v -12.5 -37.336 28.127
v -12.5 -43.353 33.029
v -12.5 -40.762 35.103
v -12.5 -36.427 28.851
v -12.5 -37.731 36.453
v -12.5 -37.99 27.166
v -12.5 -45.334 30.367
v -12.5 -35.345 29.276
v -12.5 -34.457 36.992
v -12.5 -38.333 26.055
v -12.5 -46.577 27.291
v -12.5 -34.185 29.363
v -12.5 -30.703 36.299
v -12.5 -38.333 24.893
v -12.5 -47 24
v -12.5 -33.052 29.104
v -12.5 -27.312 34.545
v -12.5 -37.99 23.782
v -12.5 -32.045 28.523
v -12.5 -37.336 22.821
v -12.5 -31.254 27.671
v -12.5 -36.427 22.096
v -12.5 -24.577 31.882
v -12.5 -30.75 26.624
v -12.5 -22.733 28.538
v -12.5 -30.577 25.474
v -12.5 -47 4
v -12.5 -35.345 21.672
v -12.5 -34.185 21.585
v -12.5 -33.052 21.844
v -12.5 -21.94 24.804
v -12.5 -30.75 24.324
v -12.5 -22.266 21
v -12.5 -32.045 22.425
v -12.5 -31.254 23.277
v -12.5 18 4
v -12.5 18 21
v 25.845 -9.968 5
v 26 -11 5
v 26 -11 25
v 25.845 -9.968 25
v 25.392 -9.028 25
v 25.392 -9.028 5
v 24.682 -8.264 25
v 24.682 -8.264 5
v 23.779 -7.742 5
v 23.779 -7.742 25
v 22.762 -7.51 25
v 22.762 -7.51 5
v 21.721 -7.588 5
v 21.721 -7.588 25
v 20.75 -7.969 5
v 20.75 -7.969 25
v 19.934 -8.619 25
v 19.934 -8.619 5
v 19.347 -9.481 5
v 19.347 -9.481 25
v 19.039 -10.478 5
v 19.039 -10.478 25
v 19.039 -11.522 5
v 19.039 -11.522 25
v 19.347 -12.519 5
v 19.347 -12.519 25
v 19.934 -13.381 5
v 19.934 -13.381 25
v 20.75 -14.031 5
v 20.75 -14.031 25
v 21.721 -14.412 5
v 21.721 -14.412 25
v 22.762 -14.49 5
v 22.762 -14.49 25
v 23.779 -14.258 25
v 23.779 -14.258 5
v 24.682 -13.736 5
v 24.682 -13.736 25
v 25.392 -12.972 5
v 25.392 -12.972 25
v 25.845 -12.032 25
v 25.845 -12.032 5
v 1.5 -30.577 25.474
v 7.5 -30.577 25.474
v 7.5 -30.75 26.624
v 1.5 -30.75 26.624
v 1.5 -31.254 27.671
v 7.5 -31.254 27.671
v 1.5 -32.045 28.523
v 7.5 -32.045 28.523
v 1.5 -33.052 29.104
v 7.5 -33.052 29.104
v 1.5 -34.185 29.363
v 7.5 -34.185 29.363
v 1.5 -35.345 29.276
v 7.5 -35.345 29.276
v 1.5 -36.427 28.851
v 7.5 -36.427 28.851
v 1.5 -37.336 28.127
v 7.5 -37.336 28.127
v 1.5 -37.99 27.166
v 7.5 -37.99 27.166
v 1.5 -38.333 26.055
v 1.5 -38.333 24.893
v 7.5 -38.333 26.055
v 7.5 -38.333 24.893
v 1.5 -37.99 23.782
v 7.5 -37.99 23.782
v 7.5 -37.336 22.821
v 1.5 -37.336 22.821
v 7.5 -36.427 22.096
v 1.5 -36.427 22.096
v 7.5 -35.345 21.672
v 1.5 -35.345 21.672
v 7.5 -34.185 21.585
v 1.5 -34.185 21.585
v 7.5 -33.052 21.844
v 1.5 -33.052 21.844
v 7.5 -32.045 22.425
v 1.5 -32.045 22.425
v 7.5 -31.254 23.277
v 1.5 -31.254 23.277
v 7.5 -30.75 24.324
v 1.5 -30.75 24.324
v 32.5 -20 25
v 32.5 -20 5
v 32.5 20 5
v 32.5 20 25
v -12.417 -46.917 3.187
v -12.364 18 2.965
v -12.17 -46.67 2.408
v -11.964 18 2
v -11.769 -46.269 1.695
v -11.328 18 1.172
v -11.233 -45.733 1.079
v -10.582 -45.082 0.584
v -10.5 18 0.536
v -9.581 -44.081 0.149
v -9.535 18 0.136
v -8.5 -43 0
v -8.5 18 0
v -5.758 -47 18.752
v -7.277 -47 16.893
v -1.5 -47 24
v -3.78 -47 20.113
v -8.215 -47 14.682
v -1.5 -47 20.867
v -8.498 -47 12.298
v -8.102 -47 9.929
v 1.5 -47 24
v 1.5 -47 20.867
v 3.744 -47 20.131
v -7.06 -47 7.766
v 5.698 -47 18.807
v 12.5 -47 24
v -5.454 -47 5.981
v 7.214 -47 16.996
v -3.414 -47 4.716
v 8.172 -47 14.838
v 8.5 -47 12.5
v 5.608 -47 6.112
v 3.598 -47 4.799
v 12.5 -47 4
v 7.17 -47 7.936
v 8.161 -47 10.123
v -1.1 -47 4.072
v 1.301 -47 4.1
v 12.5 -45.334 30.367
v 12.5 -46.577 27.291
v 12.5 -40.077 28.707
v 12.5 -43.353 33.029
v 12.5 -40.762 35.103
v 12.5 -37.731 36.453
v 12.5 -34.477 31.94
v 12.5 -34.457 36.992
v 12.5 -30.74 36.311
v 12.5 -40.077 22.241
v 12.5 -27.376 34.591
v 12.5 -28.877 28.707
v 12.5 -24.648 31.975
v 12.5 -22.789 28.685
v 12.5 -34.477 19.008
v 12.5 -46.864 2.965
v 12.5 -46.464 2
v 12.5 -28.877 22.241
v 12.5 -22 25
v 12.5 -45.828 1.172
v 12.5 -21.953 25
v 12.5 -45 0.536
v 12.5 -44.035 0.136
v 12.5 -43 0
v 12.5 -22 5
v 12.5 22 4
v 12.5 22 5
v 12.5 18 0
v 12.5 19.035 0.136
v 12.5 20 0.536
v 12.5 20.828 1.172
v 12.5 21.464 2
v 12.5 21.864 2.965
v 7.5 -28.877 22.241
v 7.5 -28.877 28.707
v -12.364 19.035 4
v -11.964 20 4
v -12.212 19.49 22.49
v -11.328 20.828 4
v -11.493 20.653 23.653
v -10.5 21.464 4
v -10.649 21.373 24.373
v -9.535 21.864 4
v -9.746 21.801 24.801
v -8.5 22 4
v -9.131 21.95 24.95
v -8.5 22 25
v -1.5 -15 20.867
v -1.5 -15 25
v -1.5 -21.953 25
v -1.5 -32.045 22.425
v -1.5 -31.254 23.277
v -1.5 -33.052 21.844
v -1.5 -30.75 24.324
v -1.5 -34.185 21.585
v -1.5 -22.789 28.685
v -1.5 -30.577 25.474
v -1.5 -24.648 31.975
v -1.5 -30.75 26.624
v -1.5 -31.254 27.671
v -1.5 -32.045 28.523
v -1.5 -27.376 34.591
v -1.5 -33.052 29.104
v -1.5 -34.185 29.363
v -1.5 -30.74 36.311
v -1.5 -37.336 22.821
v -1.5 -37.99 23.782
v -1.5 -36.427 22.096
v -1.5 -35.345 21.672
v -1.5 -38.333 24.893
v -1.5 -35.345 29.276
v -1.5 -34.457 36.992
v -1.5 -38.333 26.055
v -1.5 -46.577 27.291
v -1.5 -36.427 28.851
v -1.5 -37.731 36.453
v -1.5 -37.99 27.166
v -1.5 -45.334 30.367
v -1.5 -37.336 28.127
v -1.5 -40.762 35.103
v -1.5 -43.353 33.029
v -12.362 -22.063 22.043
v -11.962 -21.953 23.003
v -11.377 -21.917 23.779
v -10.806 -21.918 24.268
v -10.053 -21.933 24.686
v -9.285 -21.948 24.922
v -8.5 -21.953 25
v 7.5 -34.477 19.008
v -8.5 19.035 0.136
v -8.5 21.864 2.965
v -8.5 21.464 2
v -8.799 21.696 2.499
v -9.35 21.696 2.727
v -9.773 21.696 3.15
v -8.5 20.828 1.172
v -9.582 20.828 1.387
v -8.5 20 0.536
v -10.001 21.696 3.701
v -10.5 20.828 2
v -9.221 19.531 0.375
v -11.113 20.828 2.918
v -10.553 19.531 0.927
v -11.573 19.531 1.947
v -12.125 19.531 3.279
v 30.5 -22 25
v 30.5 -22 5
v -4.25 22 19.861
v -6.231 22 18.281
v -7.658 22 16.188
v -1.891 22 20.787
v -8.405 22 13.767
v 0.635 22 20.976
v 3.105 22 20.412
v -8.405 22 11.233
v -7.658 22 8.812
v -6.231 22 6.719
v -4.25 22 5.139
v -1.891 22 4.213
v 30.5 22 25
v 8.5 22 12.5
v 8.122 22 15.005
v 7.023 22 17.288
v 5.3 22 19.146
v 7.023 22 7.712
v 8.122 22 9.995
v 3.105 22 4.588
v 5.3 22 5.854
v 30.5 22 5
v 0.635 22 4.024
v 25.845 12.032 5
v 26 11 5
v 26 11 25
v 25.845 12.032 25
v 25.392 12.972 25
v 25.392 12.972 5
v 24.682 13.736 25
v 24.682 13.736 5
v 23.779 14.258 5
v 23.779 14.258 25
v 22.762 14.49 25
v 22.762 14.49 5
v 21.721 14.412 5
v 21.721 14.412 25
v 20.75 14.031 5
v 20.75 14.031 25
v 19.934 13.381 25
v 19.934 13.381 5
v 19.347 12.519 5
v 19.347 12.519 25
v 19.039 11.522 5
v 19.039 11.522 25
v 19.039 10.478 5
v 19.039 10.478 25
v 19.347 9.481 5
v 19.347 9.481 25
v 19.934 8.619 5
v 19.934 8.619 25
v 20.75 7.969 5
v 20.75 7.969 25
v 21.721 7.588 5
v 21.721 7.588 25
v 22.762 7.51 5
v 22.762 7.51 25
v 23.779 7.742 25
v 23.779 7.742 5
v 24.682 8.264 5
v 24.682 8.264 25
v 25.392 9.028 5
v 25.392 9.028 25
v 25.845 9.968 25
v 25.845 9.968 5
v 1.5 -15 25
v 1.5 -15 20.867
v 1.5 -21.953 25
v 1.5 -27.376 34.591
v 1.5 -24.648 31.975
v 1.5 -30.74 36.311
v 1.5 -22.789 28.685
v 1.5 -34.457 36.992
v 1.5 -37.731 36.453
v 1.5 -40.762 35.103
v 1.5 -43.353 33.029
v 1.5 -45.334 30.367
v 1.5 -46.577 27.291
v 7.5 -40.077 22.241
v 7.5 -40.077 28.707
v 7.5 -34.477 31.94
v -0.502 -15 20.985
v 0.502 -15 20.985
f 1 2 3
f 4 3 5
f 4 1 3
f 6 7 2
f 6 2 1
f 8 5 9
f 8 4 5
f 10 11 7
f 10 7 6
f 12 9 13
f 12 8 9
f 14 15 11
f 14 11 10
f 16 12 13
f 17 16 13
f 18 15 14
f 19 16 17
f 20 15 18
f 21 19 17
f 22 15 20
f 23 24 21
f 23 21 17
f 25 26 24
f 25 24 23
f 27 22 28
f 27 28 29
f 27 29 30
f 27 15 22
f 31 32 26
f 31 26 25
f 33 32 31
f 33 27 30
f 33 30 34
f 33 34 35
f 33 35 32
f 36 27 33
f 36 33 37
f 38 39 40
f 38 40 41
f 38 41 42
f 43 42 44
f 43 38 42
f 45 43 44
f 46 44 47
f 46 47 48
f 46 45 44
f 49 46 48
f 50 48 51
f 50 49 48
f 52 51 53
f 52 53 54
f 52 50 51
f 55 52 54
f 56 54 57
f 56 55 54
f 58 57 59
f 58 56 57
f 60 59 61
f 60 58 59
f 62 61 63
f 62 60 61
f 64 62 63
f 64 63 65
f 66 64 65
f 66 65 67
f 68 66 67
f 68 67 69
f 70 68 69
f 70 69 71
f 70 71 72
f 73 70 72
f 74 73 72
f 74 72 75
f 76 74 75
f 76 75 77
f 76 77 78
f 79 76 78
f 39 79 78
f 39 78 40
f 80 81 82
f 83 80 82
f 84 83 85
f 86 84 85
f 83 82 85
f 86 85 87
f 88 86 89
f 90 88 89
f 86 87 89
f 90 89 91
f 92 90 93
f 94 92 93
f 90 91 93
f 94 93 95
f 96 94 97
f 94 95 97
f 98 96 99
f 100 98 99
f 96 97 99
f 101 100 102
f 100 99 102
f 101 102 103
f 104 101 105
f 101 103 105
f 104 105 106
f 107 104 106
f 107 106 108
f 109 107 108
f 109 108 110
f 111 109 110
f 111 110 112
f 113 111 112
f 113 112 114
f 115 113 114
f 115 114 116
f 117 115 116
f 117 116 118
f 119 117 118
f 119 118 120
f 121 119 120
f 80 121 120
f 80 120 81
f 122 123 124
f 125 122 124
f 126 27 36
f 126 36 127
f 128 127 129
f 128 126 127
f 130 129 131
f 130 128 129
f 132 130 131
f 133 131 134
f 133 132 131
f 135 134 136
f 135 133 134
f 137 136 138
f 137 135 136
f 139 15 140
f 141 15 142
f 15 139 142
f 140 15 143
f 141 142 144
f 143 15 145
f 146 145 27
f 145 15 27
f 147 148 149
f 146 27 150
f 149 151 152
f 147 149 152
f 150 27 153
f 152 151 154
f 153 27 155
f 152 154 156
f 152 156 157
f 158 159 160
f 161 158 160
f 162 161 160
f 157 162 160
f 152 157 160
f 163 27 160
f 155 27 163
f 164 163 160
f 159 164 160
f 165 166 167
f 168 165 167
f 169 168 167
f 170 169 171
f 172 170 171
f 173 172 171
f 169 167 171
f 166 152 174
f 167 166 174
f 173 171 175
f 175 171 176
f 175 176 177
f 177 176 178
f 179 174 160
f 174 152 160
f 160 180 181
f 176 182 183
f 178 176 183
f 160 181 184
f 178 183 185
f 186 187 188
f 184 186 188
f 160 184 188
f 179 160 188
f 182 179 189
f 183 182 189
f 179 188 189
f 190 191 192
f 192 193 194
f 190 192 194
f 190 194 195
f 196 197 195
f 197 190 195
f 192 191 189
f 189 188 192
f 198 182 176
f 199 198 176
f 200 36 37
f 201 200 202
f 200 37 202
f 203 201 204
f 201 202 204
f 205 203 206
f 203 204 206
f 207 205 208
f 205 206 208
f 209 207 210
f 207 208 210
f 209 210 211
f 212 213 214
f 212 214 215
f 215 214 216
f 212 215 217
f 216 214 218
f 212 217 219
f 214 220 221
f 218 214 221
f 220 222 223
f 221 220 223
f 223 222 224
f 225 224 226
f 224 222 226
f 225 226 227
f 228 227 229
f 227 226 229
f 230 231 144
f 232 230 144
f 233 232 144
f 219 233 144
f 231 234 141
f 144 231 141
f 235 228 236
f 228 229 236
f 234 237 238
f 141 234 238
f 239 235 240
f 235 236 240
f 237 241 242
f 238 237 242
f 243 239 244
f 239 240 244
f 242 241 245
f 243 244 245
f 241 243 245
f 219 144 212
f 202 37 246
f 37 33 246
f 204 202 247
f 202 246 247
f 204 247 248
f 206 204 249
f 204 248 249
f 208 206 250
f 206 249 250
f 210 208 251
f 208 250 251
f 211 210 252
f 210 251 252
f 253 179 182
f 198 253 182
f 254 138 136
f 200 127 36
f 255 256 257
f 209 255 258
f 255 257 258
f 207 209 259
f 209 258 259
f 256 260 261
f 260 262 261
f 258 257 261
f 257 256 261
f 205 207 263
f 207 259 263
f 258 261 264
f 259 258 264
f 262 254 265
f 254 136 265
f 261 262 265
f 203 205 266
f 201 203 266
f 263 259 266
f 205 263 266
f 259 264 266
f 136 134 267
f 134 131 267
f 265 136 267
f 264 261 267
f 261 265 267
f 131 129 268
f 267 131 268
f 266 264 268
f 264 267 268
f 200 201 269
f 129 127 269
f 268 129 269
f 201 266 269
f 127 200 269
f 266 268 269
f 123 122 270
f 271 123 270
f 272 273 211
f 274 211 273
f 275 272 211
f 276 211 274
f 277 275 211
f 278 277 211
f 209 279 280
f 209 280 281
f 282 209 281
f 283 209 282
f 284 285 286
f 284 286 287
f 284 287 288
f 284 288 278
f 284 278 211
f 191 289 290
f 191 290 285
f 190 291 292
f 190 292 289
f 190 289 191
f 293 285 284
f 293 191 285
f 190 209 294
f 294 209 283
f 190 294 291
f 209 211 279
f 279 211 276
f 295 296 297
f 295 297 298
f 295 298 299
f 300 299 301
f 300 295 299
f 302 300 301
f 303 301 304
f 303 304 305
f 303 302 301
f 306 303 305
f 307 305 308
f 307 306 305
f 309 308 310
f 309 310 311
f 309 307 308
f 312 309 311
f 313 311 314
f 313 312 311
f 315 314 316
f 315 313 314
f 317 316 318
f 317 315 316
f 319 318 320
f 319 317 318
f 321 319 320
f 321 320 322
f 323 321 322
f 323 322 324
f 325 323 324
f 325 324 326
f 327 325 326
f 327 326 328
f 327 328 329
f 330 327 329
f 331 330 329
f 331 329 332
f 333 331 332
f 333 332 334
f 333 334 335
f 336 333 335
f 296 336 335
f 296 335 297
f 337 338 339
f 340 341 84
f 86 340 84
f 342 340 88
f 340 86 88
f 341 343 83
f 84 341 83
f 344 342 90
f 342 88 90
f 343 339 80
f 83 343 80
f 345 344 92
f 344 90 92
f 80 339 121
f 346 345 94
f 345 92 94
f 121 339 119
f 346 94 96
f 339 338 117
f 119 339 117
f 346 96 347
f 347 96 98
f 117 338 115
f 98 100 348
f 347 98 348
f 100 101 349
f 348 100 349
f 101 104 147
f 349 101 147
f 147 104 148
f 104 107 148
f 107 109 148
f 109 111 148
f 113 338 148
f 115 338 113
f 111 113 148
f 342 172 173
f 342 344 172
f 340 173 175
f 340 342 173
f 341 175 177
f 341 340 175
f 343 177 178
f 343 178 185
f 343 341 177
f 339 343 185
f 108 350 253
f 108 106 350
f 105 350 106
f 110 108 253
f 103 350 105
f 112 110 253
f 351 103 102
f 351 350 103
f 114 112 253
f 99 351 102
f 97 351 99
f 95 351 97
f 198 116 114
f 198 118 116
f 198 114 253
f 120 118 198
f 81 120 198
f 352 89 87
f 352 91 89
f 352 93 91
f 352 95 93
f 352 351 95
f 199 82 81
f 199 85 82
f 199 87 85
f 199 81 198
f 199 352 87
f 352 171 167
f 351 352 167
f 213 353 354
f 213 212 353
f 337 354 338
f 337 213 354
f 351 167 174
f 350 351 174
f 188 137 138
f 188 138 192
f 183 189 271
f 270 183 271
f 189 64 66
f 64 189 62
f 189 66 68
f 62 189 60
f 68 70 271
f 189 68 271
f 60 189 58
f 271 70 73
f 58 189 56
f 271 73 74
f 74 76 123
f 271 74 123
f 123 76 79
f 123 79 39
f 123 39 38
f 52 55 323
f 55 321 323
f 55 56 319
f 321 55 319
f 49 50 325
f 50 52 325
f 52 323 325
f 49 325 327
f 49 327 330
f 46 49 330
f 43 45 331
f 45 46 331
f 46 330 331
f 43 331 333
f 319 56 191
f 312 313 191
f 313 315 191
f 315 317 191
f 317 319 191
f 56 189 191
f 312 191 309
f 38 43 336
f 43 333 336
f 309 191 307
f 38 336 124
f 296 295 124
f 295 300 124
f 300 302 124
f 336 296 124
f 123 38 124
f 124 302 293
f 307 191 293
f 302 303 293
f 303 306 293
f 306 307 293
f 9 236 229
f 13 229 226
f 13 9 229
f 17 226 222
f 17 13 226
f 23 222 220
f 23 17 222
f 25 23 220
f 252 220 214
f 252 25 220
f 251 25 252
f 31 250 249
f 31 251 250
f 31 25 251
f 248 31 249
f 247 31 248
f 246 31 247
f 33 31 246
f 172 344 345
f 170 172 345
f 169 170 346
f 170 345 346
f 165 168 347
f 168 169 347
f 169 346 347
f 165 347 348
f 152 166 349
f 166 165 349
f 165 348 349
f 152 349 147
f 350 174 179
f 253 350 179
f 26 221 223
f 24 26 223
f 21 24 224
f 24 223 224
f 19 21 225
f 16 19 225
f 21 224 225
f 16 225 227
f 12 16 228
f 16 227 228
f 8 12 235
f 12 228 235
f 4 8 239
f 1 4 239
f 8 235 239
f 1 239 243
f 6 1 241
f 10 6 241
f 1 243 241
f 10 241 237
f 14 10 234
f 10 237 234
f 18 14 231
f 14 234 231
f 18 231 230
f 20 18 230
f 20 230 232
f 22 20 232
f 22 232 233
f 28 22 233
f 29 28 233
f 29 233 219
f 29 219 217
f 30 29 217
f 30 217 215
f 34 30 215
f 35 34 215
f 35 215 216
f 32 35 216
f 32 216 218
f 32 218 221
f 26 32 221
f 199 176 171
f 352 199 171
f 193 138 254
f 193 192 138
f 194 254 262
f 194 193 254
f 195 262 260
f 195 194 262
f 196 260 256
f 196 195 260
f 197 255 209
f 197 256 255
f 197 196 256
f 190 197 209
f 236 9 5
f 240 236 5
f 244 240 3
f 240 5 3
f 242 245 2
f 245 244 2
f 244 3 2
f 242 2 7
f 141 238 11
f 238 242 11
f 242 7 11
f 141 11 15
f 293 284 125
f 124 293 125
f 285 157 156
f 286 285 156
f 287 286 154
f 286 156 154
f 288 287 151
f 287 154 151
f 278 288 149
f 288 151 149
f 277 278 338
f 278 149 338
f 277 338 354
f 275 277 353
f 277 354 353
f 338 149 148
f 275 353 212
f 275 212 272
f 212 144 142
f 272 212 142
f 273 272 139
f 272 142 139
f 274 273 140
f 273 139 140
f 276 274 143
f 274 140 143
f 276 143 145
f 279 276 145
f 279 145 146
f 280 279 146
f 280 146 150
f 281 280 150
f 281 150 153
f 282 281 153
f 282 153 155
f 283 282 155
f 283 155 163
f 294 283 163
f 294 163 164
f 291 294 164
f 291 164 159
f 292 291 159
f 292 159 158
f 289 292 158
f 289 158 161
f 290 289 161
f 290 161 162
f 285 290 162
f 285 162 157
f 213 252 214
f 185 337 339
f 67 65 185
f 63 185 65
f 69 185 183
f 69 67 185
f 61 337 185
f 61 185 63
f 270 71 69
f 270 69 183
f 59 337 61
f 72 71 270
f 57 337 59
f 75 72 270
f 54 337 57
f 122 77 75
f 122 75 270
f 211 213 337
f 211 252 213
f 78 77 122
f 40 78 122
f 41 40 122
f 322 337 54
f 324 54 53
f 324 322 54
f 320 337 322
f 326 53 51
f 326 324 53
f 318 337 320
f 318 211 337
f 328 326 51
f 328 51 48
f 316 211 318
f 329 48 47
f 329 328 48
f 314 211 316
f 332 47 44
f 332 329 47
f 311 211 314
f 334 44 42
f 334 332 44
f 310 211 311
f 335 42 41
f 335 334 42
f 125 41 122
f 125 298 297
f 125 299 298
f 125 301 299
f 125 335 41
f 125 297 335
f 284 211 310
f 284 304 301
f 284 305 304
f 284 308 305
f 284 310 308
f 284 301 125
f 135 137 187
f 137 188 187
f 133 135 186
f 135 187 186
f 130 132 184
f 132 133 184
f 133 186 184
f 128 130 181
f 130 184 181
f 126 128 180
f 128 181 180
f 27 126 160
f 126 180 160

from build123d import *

# Parameters (mm, degrees)
F0_W         = 25
F0_H         = 44
F0_H_2       = 25
F1_DEPTH     = 25
F0_W_2       = 20
F0_R         = 3.5
F2_DEPTH     = 25
F3_R         = 8.5
F4_DEPTH     = 69.001
F5_W         = 11
F5_H         = 25.0466239899
F6_DEPTH     = 12
F5_W_2       = 3
F5_H_2       = 6.9533760101
F7_DEPTH     = 4.1343997347
F9_T1_DEPTH  = 76
F9_T3_DEPTH  = 76
F9_T5_DEPTH  = 75.8074069841
F9_T7_DEPTH  = 75.8074069841
F10_DEPTH    = 5
F8_R         = 3.9
F11_DEPTH    = 25.001
F12_DEPTH    = 25.001
F13_DEPTH    = 5
F14_R        = 3.99999
F15_T1_DEPTH = 30.2867319519


# Not quite as in the source:
# - a fillet or chamfer that OpenCascade refuses, or shapes differently, is made with other operations: its cross-section is extruded or revolved along the edge and cut away or added
# - a fillet or chamfer is up to 0.001 mm smaller than in the source, because OpenCascade refuses the exact size
# - a feature names something its author has since deleted; it is built from what else it names


with BuildPart() as f1:
    # F0 (on Top) → F1 (new body)
    with BuildSketch(Plane.XY):
        Rectangle(F0_W, F0_H)
        with Locations((0, -34.5)):
            Rectangle(F0_W, F0_H_2)
    extrude(amount=F1_DEPTH)

    # F0 (on Top) → F2 (join)
    with BuildSketch(Plane.XY):
        with Locations((22.5, 0)):
            Rectangle(F0_W_2, F0_H)
        with Locations((22.5, -11)):
            Circle(F0_R, mode=Mode.SUBTRACT)
        with Locations((22.5, 11)):
            Circle(F0_R, mode=Mode.SUBTRACT)
    extrude(amount=F2_DEPTH)

    # F3 (on face) → F4 (cut, through all)
    with BuildSketch(Plane.XZ.offset(47)):
        with Locations((0, 12.5)):
            Circle(F3_R)
    extrude(amount=-F4_DEPTH, mode=Mode.SUBTRACT)

    # F5 (on face) → F6 (join)
    with BuildSketch(Plane.XY.offset(25)):
        with Locations((-7, -34.476688005)):
            Rectangle(F5_W, F5_H)
        Polygon((12.5, -22), (12.5, -21.9533760101), (1.5, -21.9533760101), (1.5, -47), (12.5, -47), align=None)
    extrude(amount=F6_DEPTH)

    # F5 (on face) → F7 (cut, through all)
    with BuildSketch(Plane.XY.offset(25)):
        with Locations((0, -34.476688005)):
            Rectangle(F5_W_2, F5_H)
        with Locations((0, -18.476688005)):
            Rectangle(F5_W_2, F5_H_2)
    extrude(amount=-F7_DEPTH, mode=Mode.SUBTRACT)

    # F9: fillet of radius 13 on 4 edges, made by hand

    # F9_s2 → F9_t1 (cut)
    with BuildSketch(Plane.YZ.offset(-45)):
        with BuildLine():
            ThreePointArc((-34, 37), (-43.1923881554, 33.1923881554), (-47, 24))
            Line((-47, 24), (-47, 37))
            Line((-47, 37), (-34, 37))
        make_face()
    extrude(amount=F9_T1_DEPTH, mode=Mode.SUBTRACT)

    # F9_s4 → F9_t3 (cut)
    with BuildSketch(Plane.YZ.offset(-31)):
        with BuildLine():
            ThreePointArc((-34, 37), (-43.1923881554, 33.1923881554), (-47, 24))
            Line((-47, 24), (-47, 37))
            Line((-47, 37), (-34, 37))
        make_face()
    extrude(amount=F9_T3_DEPTH, mode=Mode.SUBTRACT)

    # F9_s6 → F9_t5 (cut)
    with BuildSketch(Plane.YZ.offset(-30.903703492)):
        with BuildLine():
            ThreePointArc((-34.9148574069, 37), (-26.0830965405, 33.5393920142), (-21.9533760101, 25))
            Line((-21.9533760101, 25), (-21.9533760101, 37))
            Line((-21.9533760101, 37), (-34.9148574069, 37))
        make_face()
    extrude(amount=F9_T5_DEPTH, mode=Mode.SUBTRACT)

    # F9_s8 → F9_t7 (cut)
    with BuildSketch(Plane.YZ.offset(-44.903703492)):
        with BuildLine():
            ThreePointArc((-21.9533760101, 25), (-26.0830965405, 33.5393920142), (-34.9148574069, 37))
            Line((-34.9148574069, 37), (-21.9533760101, 37))
            Line((-21.9533760101, 37), (-21.9533760101, 25))
        make_face()
    extrude(amount=F9_T7_DEPTH, mode=Mode.SUBTRACT)

    # F0 (on Top) → F10 (cut)
    with BuildSketch(Plane.XY):
        with Locations((22.5, 0)):
            Rectangle(F0_W_2, F0_H)
        with Locations((22.5, -11)):
            Circle(F0_R, mode=Mode.SUBTRACT)
        with Locations((22.5, 11)):
            Circle(F0_R, mode=Mode.SUBTRACT)
    extrude(amount=F10_DEPTH, mode=Mode.SUBTRACT)

    # F8 (on face) → F11 (cut, through all)
    with BuildSketch(Plane.YZ.offset(12.5)):
        with Locations((-34.476688005, 25.4739885092)):
            Circle(F8_R)
    extrude(amount=-F11_DEPTH, mode=Mode.SUBTRACT)

    # F8 (on face) → F12 (cut, through all)
    with BuildSketch(Plane.YZ.offset(12.5)):
        with Locations((-34.476688005, 25.4739885092)):
            Circle(F8_R)
    extrude(amount=-F12_DEPTH, mode=Mode.SUBTRACT)

    # F8 (on face) → F13 (cut)
    with BuildSketch(Plane.YZ.offset(12.5)):
        Polygon((-40.076688005, 28.7071500166), (-40.076688005, 22.2408270017), (-34.476688005, 19.0076654943), (-28.876688005, 22.2408270017), (-28.876688005, 28.7071500166), (-34.476688005, 31.9403115241), align=None)
        with Locations((-34.476688005, 25.4739885092)):
            Circle(F8_R, mode=Mode.SUBTRACT)
    extrude(amount=-F13_DEPTH, mode=Mode.SUBTRACT)

    # F14 (radius 4 in the source; OpenCascade refuses exactly that, so slightly less here)
    f14_edges = [f1.edges().sort_by_distance(p)[0] for p in [
        (-12.5, -12.5, 0),
        (0, -47, 0),
        (-12.5, 0.023312, 25),
        (0, 22, 0),
        (-12.5, 22, 12.5),
    ]]
    fillet(f14_edges, radius=F14_R)

    # F15: chamfer of 2 on 2 edges, made by hand

    # F15_s2 → F15_t1 (cut)
    with BuildSketch(Plane.XY.offset(-0.1433659759)):
        Polygon((30.5, 22), (32.5, 20), (32.5, 22), align=None)
        Polygon((32.5, -20), (30.5, -22), (32.5, -22), align=None)
    extrude(amount=F15_T1_DEPTH, mode=Mode.SUBTRACT)


solid = f1.part
